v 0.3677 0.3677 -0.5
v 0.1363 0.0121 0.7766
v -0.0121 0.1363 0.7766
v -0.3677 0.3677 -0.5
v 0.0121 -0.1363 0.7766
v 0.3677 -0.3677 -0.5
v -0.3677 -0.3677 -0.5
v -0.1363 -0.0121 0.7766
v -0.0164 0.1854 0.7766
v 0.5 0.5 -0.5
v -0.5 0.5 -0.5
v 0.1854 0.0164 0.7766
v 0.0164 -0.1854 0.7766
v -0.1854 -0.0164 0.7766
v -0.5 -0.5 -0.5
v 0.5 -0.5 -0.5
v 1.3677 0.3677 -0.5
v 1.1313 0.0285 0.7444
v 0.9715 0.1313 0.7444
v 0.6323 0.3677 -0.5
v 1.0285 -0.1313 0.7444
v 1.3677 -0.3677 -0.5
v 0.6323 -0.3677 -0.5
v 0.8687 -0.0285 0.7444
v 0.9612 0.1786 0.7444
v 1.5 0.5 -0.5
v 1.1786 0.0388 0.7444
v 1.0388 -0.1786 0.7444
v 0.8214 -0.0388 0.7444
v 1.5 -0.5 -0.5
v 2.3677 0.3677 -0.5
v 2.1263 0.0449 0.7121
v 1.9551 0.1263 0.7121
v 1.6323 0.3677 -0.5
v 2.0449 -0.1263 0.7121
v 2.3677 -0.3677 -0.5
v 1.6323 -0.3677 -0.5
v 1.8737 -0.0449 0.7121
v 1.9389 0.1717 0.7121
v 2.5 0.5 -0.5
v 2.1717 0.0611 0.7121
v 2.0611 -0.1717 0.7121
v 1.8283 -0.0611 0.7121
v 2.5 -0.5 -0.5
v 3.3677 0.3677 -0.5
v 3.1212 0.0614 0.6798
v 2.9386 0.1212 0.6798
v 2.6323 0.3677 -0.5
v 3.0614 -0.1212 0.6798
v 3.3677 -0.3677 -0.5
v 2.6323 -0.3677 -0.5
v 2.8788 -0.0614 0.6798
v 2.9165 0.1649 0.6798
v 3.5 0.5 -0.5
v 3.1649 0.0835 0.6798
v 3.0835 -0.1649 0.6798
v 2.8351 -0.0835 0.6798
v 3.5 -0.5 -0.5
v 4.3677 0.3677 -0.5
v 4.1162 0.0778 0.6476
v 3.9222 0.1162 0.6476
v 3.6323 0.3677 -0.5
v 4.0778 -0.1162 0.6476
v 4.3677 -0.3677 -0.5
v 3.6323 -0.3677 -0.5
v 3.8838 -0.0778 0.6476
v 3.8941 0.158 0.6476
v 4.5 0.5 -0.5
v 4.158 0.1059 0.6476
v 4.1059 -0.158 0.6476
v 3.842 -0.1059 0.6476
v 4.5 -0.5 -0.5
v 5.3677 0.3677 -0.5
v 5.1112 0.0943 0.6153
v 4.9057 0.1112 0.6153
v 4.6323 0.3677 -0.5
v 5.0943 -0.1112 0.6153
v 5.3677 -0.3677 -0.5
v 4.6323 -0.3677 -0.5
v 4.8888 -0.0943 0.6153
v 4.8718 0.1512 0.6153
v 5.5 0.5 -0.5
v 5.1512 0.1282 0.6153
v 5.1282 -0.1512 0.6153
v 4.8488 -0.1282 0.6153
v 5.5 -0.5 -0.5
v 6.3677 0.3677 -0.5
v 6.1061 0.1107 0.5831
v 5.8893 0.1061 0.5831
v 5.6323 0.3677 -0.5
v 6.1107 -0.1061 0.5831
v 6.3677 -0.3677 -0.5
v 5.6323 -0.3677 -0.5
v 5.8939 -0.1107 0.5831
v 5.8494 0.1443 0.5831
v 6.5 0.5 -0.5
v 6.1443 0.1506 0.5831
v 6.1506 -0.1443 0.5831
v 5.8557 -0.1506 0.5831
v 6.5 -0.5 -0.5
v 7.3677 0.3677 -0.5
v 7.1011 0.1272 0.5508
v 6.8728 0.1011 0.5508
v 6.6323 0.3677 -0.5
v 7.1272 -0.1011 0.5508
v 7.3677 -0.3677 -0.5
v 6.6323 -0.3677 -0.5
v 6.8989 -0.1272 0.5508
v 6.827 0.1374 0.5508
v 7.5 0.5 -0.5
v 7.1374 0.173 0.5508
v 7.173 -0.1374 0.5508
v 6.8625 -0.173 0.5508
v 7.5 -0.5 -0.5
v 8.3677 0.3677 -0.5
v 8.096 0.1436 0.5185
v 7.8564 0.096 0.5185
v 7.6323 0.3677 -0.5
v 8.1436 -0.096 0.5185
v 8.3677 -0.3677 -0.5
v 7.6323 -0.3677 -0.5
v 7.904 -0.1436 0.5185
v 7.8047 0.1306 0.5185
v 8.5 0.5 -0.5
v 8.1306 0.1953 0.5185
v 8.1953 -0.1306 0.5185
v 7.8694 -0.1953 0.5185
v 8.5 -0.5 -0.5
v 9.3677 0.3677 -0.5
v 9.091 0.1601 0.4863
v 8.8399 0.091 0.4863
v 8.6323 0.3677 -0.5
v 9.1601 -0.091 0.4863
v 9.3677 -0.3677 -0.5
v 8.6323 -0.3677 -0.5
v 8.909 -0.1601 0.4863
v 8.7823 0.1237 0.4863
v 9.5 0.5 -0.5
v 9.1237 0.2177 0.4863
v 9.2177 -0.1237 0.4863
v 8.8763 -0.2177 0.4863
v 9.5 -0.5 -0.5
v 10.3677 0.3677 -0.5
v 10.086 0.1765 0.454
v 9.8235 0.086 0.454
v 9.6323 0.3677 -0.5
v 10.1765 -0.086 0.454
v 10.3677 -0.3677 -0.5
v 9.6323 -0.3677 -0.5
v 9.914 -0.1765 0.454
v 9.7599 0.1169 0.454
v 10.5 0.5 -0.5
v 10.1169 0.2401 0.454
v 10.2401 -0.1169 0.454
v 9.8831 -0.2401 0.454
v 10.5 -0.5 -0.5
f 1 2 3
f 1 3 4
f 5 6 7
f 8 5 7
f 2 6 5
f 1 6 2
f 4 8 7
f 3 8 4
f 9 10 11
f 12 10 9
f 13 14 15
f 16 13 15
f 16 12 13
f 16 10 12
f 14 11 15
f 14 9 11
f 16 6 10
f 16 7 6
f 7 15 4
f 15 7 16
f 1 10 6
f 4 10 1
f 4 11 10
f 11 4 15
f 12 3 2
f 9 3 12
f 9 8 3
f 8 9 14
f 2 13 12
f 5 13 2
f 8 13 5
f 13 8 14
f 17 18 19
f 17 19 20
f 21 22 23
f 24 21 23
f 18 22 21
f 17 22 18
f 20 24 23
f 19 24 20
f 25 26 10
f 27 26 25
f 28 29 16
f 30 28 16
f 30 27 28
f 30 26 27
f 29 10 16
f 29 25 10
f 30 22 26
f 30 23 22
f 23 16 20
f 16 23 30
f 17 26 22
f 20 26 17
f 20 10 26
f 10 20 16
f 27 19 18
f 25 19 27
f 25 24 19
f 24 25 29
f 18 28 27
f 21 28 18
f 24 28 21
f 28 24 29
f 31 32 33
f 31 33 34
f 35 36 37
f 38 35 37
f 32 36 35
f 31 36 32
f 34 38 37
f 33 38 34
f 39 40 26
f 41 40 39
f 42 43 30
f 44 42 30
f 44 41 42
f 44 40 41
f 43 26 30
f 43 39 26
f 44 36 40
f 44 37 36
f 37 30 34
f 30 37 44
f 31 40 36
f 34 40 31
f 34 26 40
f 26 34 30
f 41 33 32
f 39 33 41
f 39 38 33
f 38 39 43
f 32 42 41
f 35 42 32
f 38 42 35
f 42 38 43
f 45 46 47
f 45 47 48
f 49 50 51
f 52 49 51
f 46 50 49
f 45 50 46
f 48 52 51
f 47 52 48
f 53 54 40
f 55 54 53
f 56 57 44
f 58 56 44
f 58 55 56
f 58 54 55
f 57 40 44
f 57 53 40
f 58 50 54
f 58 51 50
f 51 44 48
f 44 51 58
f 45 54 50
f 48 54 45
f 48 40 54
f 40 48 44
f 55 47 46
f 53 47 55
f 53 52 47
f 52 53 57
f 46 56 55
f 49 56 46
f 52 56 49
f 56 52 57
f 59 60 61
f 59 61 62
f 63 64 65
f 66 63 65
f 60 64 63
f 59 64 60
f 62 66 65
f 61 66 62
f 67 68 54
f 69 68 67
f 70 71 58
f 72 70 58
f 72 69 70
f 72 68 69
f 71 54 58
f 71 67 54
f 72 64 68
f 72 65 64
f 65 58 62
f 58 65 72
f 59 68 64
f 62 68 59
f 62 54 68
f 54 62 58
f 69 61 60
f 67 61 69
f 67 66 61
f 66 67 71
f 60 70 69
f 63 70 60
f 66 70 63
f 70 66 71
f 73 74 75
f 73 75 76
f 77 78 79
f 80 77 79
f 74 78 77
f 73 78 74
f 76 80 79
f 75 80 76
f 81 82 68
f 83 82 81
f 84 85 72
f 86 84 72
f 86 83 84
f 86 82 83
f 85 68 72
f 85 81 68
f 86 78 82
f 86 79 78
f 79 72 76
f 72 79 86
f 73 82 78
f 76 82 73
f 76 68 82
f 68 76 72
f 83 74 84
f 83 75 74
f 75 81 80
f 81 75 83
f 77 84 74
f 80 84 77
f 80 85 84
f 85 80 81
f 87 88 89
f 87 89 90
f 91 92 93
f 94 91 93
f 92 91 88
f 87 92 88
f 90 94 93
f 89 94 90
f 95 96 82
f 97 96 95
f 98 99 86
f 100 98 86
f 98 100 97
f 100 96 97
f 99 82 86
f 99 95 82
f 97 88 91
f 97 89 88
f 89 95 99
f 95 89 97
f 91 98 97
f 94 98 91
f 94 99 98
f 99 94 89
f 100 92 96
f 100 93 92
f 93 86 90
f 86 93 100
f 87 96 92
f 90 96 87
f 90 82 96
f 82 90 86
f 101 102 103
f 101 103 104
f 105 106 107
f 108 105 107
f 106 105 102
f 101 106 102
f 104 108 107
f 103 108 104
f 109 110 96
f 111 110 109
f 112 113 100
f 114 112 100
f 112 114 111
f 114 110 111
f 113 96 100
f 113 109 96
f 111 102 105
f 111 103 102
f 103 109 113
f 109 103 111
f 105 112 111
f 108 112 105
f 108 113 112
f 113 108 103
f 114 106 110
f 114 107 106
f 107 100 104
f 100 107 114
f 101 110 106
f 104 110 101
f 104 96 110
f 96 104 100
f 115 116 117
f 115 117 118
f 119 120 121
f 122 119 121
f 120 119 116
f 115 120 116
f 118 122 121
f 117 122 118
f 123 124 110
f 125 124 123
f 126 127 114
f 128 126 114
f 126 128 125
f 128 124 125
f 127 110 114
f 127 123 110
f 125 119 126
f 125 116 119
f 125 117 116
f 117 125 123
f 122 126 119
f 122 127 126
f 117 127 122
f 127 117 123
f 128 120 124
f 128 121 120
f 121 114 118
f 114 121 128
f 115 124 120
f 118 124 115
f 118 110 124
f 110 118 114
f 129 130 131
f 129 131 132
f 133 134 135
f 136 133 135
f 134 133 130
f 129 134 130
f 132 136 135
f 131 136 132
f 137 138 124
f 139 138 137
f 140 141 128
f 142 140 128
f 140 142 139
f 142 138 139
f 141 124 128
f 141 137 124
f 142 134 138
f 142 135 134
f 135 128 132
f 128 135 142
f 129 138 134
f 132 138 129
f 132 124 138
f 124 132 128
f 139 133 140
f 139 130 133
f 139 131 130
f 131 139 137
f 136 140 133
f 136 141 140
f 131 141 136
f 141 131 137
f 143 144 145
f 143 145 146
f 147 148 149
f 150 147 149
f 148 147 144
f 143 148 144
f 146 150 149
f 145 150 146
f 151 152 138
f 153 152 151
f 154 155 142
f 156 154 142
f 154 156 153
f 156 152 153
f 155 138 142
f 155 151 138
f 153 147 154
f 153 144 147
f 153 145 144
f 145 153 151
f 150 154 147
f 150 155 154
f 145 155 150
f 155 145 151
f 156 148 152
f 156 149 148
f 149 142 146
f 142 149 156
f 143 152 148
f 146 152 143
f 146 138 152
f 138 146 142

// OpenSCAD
/* [Global] */

pvalue = 20; // [10.0:20.0]
pvalue_text = "blah blah blah";

/* [Hidden] */

points_01 = [[-0.048376, -0.463729, 0.131425], [0.463729, -0.048376, 0.131425], [-0.463729, 0.048376, 0.131425], [0.048376, 0.463729, 0.131425], [-0.5, 0.5, -0.5], [0.5, 0.5, -0.5], [-0.5, -0.5, -0.5], [0.5, -0.5, -0.5], [-0.341008, 0.035574, 0.131425], [0.035574, 0.341008, 0.131425], [0.36768, 0.36768, -0.5], [-0.36768, 0.36768, -0.5], [-0.36768, -0.36768, -0.5], [0.36768, -0.36768, -0.5], [0.341008, -0.035574, 0.131425], [-0.035574, -0.341008, 0.131425]];
triangles_01 = [[8, 9, 11], [11, 9, 10], [12, 13, 15], [15, 13, 14], [13, 10, 14], [14, 10, 9], [15, 8, 12], [12, 8, 11], [2, 4, 3], [3, 4, 5], [6, 0, 7], [7, 0, 1], [3, 5, 1], [1, 5, 7], [4, 2, 6], [6, 2, 0], [2, 3, 8], [8, 3, 9], [5, 4, 10], [10, 4, 11], [6, 7, 12], [12, 7, 13], [1, 0, 14], [14, 0, 15], [7, 5, 13], [13, 5, 10], [3, 1, 9], [9, 1, 14], [0, 2, 15], [15, 2, 8], [4, 6, 11], [11, 6, 12]];

points_02 = [[-0.185412, -0.01639, 0.776613], [0.01639, -0.185412, 0.776613], [-0.01639, 0.185412, 0.776613], [0.185412, 0.01639, 0.776613], [-0.5, 0.5, -0.5], [0.5, 0.5, -0.5], [-0.5, -0.5, -0.5], [0.5, -0.5, -0.5], [-0.012052, 0.136344, 0.776613], [0.136344, 0.012052, 0.776613], [0.36768, 0.36768, -0.5], [-0.36768, 0.36768, -0.5], [-0.36768, -0.36768, -0.5], [0.36768, -0.36768, -0.5], [0.012052, -0.136344, 0.776613], [-0.136344, -0.012052, 0.776613]];
triangles_02 = [[9, 10, 8], [8, 10, 11], [13, 14, 12], [12, 14, 15], [14, 13, 9], [9, 13, 10], [12, 15, 11], [11, 15, 8], [4, 5, 2], [2, 5, 3], [0, 1, 6], [6, 1, 7], [1, 3, 7], [7, 3, 5], [6, 4, 0], [0, 4, 2], [2, 3, 8], [8, 3, 9], [5, 4, 10], [10, 4, 11], [6, 7, 12], [12, 7, 13], [1, 0, 14], [14, 0, 15], [7, 5, 13], [13, 5, 10], [3, 1, 9], [9, 1, 14], [0, 2, 15], [15, 2, 8], [4, 6, 11], [11, 6, 12]];

vectors = points_01 - points_02;

for (i = [0:10]){
translate([i, 0, 0])
polyhedron(points=points_02+vectors*(i/pvalue), triangles=triangles_02);
}
